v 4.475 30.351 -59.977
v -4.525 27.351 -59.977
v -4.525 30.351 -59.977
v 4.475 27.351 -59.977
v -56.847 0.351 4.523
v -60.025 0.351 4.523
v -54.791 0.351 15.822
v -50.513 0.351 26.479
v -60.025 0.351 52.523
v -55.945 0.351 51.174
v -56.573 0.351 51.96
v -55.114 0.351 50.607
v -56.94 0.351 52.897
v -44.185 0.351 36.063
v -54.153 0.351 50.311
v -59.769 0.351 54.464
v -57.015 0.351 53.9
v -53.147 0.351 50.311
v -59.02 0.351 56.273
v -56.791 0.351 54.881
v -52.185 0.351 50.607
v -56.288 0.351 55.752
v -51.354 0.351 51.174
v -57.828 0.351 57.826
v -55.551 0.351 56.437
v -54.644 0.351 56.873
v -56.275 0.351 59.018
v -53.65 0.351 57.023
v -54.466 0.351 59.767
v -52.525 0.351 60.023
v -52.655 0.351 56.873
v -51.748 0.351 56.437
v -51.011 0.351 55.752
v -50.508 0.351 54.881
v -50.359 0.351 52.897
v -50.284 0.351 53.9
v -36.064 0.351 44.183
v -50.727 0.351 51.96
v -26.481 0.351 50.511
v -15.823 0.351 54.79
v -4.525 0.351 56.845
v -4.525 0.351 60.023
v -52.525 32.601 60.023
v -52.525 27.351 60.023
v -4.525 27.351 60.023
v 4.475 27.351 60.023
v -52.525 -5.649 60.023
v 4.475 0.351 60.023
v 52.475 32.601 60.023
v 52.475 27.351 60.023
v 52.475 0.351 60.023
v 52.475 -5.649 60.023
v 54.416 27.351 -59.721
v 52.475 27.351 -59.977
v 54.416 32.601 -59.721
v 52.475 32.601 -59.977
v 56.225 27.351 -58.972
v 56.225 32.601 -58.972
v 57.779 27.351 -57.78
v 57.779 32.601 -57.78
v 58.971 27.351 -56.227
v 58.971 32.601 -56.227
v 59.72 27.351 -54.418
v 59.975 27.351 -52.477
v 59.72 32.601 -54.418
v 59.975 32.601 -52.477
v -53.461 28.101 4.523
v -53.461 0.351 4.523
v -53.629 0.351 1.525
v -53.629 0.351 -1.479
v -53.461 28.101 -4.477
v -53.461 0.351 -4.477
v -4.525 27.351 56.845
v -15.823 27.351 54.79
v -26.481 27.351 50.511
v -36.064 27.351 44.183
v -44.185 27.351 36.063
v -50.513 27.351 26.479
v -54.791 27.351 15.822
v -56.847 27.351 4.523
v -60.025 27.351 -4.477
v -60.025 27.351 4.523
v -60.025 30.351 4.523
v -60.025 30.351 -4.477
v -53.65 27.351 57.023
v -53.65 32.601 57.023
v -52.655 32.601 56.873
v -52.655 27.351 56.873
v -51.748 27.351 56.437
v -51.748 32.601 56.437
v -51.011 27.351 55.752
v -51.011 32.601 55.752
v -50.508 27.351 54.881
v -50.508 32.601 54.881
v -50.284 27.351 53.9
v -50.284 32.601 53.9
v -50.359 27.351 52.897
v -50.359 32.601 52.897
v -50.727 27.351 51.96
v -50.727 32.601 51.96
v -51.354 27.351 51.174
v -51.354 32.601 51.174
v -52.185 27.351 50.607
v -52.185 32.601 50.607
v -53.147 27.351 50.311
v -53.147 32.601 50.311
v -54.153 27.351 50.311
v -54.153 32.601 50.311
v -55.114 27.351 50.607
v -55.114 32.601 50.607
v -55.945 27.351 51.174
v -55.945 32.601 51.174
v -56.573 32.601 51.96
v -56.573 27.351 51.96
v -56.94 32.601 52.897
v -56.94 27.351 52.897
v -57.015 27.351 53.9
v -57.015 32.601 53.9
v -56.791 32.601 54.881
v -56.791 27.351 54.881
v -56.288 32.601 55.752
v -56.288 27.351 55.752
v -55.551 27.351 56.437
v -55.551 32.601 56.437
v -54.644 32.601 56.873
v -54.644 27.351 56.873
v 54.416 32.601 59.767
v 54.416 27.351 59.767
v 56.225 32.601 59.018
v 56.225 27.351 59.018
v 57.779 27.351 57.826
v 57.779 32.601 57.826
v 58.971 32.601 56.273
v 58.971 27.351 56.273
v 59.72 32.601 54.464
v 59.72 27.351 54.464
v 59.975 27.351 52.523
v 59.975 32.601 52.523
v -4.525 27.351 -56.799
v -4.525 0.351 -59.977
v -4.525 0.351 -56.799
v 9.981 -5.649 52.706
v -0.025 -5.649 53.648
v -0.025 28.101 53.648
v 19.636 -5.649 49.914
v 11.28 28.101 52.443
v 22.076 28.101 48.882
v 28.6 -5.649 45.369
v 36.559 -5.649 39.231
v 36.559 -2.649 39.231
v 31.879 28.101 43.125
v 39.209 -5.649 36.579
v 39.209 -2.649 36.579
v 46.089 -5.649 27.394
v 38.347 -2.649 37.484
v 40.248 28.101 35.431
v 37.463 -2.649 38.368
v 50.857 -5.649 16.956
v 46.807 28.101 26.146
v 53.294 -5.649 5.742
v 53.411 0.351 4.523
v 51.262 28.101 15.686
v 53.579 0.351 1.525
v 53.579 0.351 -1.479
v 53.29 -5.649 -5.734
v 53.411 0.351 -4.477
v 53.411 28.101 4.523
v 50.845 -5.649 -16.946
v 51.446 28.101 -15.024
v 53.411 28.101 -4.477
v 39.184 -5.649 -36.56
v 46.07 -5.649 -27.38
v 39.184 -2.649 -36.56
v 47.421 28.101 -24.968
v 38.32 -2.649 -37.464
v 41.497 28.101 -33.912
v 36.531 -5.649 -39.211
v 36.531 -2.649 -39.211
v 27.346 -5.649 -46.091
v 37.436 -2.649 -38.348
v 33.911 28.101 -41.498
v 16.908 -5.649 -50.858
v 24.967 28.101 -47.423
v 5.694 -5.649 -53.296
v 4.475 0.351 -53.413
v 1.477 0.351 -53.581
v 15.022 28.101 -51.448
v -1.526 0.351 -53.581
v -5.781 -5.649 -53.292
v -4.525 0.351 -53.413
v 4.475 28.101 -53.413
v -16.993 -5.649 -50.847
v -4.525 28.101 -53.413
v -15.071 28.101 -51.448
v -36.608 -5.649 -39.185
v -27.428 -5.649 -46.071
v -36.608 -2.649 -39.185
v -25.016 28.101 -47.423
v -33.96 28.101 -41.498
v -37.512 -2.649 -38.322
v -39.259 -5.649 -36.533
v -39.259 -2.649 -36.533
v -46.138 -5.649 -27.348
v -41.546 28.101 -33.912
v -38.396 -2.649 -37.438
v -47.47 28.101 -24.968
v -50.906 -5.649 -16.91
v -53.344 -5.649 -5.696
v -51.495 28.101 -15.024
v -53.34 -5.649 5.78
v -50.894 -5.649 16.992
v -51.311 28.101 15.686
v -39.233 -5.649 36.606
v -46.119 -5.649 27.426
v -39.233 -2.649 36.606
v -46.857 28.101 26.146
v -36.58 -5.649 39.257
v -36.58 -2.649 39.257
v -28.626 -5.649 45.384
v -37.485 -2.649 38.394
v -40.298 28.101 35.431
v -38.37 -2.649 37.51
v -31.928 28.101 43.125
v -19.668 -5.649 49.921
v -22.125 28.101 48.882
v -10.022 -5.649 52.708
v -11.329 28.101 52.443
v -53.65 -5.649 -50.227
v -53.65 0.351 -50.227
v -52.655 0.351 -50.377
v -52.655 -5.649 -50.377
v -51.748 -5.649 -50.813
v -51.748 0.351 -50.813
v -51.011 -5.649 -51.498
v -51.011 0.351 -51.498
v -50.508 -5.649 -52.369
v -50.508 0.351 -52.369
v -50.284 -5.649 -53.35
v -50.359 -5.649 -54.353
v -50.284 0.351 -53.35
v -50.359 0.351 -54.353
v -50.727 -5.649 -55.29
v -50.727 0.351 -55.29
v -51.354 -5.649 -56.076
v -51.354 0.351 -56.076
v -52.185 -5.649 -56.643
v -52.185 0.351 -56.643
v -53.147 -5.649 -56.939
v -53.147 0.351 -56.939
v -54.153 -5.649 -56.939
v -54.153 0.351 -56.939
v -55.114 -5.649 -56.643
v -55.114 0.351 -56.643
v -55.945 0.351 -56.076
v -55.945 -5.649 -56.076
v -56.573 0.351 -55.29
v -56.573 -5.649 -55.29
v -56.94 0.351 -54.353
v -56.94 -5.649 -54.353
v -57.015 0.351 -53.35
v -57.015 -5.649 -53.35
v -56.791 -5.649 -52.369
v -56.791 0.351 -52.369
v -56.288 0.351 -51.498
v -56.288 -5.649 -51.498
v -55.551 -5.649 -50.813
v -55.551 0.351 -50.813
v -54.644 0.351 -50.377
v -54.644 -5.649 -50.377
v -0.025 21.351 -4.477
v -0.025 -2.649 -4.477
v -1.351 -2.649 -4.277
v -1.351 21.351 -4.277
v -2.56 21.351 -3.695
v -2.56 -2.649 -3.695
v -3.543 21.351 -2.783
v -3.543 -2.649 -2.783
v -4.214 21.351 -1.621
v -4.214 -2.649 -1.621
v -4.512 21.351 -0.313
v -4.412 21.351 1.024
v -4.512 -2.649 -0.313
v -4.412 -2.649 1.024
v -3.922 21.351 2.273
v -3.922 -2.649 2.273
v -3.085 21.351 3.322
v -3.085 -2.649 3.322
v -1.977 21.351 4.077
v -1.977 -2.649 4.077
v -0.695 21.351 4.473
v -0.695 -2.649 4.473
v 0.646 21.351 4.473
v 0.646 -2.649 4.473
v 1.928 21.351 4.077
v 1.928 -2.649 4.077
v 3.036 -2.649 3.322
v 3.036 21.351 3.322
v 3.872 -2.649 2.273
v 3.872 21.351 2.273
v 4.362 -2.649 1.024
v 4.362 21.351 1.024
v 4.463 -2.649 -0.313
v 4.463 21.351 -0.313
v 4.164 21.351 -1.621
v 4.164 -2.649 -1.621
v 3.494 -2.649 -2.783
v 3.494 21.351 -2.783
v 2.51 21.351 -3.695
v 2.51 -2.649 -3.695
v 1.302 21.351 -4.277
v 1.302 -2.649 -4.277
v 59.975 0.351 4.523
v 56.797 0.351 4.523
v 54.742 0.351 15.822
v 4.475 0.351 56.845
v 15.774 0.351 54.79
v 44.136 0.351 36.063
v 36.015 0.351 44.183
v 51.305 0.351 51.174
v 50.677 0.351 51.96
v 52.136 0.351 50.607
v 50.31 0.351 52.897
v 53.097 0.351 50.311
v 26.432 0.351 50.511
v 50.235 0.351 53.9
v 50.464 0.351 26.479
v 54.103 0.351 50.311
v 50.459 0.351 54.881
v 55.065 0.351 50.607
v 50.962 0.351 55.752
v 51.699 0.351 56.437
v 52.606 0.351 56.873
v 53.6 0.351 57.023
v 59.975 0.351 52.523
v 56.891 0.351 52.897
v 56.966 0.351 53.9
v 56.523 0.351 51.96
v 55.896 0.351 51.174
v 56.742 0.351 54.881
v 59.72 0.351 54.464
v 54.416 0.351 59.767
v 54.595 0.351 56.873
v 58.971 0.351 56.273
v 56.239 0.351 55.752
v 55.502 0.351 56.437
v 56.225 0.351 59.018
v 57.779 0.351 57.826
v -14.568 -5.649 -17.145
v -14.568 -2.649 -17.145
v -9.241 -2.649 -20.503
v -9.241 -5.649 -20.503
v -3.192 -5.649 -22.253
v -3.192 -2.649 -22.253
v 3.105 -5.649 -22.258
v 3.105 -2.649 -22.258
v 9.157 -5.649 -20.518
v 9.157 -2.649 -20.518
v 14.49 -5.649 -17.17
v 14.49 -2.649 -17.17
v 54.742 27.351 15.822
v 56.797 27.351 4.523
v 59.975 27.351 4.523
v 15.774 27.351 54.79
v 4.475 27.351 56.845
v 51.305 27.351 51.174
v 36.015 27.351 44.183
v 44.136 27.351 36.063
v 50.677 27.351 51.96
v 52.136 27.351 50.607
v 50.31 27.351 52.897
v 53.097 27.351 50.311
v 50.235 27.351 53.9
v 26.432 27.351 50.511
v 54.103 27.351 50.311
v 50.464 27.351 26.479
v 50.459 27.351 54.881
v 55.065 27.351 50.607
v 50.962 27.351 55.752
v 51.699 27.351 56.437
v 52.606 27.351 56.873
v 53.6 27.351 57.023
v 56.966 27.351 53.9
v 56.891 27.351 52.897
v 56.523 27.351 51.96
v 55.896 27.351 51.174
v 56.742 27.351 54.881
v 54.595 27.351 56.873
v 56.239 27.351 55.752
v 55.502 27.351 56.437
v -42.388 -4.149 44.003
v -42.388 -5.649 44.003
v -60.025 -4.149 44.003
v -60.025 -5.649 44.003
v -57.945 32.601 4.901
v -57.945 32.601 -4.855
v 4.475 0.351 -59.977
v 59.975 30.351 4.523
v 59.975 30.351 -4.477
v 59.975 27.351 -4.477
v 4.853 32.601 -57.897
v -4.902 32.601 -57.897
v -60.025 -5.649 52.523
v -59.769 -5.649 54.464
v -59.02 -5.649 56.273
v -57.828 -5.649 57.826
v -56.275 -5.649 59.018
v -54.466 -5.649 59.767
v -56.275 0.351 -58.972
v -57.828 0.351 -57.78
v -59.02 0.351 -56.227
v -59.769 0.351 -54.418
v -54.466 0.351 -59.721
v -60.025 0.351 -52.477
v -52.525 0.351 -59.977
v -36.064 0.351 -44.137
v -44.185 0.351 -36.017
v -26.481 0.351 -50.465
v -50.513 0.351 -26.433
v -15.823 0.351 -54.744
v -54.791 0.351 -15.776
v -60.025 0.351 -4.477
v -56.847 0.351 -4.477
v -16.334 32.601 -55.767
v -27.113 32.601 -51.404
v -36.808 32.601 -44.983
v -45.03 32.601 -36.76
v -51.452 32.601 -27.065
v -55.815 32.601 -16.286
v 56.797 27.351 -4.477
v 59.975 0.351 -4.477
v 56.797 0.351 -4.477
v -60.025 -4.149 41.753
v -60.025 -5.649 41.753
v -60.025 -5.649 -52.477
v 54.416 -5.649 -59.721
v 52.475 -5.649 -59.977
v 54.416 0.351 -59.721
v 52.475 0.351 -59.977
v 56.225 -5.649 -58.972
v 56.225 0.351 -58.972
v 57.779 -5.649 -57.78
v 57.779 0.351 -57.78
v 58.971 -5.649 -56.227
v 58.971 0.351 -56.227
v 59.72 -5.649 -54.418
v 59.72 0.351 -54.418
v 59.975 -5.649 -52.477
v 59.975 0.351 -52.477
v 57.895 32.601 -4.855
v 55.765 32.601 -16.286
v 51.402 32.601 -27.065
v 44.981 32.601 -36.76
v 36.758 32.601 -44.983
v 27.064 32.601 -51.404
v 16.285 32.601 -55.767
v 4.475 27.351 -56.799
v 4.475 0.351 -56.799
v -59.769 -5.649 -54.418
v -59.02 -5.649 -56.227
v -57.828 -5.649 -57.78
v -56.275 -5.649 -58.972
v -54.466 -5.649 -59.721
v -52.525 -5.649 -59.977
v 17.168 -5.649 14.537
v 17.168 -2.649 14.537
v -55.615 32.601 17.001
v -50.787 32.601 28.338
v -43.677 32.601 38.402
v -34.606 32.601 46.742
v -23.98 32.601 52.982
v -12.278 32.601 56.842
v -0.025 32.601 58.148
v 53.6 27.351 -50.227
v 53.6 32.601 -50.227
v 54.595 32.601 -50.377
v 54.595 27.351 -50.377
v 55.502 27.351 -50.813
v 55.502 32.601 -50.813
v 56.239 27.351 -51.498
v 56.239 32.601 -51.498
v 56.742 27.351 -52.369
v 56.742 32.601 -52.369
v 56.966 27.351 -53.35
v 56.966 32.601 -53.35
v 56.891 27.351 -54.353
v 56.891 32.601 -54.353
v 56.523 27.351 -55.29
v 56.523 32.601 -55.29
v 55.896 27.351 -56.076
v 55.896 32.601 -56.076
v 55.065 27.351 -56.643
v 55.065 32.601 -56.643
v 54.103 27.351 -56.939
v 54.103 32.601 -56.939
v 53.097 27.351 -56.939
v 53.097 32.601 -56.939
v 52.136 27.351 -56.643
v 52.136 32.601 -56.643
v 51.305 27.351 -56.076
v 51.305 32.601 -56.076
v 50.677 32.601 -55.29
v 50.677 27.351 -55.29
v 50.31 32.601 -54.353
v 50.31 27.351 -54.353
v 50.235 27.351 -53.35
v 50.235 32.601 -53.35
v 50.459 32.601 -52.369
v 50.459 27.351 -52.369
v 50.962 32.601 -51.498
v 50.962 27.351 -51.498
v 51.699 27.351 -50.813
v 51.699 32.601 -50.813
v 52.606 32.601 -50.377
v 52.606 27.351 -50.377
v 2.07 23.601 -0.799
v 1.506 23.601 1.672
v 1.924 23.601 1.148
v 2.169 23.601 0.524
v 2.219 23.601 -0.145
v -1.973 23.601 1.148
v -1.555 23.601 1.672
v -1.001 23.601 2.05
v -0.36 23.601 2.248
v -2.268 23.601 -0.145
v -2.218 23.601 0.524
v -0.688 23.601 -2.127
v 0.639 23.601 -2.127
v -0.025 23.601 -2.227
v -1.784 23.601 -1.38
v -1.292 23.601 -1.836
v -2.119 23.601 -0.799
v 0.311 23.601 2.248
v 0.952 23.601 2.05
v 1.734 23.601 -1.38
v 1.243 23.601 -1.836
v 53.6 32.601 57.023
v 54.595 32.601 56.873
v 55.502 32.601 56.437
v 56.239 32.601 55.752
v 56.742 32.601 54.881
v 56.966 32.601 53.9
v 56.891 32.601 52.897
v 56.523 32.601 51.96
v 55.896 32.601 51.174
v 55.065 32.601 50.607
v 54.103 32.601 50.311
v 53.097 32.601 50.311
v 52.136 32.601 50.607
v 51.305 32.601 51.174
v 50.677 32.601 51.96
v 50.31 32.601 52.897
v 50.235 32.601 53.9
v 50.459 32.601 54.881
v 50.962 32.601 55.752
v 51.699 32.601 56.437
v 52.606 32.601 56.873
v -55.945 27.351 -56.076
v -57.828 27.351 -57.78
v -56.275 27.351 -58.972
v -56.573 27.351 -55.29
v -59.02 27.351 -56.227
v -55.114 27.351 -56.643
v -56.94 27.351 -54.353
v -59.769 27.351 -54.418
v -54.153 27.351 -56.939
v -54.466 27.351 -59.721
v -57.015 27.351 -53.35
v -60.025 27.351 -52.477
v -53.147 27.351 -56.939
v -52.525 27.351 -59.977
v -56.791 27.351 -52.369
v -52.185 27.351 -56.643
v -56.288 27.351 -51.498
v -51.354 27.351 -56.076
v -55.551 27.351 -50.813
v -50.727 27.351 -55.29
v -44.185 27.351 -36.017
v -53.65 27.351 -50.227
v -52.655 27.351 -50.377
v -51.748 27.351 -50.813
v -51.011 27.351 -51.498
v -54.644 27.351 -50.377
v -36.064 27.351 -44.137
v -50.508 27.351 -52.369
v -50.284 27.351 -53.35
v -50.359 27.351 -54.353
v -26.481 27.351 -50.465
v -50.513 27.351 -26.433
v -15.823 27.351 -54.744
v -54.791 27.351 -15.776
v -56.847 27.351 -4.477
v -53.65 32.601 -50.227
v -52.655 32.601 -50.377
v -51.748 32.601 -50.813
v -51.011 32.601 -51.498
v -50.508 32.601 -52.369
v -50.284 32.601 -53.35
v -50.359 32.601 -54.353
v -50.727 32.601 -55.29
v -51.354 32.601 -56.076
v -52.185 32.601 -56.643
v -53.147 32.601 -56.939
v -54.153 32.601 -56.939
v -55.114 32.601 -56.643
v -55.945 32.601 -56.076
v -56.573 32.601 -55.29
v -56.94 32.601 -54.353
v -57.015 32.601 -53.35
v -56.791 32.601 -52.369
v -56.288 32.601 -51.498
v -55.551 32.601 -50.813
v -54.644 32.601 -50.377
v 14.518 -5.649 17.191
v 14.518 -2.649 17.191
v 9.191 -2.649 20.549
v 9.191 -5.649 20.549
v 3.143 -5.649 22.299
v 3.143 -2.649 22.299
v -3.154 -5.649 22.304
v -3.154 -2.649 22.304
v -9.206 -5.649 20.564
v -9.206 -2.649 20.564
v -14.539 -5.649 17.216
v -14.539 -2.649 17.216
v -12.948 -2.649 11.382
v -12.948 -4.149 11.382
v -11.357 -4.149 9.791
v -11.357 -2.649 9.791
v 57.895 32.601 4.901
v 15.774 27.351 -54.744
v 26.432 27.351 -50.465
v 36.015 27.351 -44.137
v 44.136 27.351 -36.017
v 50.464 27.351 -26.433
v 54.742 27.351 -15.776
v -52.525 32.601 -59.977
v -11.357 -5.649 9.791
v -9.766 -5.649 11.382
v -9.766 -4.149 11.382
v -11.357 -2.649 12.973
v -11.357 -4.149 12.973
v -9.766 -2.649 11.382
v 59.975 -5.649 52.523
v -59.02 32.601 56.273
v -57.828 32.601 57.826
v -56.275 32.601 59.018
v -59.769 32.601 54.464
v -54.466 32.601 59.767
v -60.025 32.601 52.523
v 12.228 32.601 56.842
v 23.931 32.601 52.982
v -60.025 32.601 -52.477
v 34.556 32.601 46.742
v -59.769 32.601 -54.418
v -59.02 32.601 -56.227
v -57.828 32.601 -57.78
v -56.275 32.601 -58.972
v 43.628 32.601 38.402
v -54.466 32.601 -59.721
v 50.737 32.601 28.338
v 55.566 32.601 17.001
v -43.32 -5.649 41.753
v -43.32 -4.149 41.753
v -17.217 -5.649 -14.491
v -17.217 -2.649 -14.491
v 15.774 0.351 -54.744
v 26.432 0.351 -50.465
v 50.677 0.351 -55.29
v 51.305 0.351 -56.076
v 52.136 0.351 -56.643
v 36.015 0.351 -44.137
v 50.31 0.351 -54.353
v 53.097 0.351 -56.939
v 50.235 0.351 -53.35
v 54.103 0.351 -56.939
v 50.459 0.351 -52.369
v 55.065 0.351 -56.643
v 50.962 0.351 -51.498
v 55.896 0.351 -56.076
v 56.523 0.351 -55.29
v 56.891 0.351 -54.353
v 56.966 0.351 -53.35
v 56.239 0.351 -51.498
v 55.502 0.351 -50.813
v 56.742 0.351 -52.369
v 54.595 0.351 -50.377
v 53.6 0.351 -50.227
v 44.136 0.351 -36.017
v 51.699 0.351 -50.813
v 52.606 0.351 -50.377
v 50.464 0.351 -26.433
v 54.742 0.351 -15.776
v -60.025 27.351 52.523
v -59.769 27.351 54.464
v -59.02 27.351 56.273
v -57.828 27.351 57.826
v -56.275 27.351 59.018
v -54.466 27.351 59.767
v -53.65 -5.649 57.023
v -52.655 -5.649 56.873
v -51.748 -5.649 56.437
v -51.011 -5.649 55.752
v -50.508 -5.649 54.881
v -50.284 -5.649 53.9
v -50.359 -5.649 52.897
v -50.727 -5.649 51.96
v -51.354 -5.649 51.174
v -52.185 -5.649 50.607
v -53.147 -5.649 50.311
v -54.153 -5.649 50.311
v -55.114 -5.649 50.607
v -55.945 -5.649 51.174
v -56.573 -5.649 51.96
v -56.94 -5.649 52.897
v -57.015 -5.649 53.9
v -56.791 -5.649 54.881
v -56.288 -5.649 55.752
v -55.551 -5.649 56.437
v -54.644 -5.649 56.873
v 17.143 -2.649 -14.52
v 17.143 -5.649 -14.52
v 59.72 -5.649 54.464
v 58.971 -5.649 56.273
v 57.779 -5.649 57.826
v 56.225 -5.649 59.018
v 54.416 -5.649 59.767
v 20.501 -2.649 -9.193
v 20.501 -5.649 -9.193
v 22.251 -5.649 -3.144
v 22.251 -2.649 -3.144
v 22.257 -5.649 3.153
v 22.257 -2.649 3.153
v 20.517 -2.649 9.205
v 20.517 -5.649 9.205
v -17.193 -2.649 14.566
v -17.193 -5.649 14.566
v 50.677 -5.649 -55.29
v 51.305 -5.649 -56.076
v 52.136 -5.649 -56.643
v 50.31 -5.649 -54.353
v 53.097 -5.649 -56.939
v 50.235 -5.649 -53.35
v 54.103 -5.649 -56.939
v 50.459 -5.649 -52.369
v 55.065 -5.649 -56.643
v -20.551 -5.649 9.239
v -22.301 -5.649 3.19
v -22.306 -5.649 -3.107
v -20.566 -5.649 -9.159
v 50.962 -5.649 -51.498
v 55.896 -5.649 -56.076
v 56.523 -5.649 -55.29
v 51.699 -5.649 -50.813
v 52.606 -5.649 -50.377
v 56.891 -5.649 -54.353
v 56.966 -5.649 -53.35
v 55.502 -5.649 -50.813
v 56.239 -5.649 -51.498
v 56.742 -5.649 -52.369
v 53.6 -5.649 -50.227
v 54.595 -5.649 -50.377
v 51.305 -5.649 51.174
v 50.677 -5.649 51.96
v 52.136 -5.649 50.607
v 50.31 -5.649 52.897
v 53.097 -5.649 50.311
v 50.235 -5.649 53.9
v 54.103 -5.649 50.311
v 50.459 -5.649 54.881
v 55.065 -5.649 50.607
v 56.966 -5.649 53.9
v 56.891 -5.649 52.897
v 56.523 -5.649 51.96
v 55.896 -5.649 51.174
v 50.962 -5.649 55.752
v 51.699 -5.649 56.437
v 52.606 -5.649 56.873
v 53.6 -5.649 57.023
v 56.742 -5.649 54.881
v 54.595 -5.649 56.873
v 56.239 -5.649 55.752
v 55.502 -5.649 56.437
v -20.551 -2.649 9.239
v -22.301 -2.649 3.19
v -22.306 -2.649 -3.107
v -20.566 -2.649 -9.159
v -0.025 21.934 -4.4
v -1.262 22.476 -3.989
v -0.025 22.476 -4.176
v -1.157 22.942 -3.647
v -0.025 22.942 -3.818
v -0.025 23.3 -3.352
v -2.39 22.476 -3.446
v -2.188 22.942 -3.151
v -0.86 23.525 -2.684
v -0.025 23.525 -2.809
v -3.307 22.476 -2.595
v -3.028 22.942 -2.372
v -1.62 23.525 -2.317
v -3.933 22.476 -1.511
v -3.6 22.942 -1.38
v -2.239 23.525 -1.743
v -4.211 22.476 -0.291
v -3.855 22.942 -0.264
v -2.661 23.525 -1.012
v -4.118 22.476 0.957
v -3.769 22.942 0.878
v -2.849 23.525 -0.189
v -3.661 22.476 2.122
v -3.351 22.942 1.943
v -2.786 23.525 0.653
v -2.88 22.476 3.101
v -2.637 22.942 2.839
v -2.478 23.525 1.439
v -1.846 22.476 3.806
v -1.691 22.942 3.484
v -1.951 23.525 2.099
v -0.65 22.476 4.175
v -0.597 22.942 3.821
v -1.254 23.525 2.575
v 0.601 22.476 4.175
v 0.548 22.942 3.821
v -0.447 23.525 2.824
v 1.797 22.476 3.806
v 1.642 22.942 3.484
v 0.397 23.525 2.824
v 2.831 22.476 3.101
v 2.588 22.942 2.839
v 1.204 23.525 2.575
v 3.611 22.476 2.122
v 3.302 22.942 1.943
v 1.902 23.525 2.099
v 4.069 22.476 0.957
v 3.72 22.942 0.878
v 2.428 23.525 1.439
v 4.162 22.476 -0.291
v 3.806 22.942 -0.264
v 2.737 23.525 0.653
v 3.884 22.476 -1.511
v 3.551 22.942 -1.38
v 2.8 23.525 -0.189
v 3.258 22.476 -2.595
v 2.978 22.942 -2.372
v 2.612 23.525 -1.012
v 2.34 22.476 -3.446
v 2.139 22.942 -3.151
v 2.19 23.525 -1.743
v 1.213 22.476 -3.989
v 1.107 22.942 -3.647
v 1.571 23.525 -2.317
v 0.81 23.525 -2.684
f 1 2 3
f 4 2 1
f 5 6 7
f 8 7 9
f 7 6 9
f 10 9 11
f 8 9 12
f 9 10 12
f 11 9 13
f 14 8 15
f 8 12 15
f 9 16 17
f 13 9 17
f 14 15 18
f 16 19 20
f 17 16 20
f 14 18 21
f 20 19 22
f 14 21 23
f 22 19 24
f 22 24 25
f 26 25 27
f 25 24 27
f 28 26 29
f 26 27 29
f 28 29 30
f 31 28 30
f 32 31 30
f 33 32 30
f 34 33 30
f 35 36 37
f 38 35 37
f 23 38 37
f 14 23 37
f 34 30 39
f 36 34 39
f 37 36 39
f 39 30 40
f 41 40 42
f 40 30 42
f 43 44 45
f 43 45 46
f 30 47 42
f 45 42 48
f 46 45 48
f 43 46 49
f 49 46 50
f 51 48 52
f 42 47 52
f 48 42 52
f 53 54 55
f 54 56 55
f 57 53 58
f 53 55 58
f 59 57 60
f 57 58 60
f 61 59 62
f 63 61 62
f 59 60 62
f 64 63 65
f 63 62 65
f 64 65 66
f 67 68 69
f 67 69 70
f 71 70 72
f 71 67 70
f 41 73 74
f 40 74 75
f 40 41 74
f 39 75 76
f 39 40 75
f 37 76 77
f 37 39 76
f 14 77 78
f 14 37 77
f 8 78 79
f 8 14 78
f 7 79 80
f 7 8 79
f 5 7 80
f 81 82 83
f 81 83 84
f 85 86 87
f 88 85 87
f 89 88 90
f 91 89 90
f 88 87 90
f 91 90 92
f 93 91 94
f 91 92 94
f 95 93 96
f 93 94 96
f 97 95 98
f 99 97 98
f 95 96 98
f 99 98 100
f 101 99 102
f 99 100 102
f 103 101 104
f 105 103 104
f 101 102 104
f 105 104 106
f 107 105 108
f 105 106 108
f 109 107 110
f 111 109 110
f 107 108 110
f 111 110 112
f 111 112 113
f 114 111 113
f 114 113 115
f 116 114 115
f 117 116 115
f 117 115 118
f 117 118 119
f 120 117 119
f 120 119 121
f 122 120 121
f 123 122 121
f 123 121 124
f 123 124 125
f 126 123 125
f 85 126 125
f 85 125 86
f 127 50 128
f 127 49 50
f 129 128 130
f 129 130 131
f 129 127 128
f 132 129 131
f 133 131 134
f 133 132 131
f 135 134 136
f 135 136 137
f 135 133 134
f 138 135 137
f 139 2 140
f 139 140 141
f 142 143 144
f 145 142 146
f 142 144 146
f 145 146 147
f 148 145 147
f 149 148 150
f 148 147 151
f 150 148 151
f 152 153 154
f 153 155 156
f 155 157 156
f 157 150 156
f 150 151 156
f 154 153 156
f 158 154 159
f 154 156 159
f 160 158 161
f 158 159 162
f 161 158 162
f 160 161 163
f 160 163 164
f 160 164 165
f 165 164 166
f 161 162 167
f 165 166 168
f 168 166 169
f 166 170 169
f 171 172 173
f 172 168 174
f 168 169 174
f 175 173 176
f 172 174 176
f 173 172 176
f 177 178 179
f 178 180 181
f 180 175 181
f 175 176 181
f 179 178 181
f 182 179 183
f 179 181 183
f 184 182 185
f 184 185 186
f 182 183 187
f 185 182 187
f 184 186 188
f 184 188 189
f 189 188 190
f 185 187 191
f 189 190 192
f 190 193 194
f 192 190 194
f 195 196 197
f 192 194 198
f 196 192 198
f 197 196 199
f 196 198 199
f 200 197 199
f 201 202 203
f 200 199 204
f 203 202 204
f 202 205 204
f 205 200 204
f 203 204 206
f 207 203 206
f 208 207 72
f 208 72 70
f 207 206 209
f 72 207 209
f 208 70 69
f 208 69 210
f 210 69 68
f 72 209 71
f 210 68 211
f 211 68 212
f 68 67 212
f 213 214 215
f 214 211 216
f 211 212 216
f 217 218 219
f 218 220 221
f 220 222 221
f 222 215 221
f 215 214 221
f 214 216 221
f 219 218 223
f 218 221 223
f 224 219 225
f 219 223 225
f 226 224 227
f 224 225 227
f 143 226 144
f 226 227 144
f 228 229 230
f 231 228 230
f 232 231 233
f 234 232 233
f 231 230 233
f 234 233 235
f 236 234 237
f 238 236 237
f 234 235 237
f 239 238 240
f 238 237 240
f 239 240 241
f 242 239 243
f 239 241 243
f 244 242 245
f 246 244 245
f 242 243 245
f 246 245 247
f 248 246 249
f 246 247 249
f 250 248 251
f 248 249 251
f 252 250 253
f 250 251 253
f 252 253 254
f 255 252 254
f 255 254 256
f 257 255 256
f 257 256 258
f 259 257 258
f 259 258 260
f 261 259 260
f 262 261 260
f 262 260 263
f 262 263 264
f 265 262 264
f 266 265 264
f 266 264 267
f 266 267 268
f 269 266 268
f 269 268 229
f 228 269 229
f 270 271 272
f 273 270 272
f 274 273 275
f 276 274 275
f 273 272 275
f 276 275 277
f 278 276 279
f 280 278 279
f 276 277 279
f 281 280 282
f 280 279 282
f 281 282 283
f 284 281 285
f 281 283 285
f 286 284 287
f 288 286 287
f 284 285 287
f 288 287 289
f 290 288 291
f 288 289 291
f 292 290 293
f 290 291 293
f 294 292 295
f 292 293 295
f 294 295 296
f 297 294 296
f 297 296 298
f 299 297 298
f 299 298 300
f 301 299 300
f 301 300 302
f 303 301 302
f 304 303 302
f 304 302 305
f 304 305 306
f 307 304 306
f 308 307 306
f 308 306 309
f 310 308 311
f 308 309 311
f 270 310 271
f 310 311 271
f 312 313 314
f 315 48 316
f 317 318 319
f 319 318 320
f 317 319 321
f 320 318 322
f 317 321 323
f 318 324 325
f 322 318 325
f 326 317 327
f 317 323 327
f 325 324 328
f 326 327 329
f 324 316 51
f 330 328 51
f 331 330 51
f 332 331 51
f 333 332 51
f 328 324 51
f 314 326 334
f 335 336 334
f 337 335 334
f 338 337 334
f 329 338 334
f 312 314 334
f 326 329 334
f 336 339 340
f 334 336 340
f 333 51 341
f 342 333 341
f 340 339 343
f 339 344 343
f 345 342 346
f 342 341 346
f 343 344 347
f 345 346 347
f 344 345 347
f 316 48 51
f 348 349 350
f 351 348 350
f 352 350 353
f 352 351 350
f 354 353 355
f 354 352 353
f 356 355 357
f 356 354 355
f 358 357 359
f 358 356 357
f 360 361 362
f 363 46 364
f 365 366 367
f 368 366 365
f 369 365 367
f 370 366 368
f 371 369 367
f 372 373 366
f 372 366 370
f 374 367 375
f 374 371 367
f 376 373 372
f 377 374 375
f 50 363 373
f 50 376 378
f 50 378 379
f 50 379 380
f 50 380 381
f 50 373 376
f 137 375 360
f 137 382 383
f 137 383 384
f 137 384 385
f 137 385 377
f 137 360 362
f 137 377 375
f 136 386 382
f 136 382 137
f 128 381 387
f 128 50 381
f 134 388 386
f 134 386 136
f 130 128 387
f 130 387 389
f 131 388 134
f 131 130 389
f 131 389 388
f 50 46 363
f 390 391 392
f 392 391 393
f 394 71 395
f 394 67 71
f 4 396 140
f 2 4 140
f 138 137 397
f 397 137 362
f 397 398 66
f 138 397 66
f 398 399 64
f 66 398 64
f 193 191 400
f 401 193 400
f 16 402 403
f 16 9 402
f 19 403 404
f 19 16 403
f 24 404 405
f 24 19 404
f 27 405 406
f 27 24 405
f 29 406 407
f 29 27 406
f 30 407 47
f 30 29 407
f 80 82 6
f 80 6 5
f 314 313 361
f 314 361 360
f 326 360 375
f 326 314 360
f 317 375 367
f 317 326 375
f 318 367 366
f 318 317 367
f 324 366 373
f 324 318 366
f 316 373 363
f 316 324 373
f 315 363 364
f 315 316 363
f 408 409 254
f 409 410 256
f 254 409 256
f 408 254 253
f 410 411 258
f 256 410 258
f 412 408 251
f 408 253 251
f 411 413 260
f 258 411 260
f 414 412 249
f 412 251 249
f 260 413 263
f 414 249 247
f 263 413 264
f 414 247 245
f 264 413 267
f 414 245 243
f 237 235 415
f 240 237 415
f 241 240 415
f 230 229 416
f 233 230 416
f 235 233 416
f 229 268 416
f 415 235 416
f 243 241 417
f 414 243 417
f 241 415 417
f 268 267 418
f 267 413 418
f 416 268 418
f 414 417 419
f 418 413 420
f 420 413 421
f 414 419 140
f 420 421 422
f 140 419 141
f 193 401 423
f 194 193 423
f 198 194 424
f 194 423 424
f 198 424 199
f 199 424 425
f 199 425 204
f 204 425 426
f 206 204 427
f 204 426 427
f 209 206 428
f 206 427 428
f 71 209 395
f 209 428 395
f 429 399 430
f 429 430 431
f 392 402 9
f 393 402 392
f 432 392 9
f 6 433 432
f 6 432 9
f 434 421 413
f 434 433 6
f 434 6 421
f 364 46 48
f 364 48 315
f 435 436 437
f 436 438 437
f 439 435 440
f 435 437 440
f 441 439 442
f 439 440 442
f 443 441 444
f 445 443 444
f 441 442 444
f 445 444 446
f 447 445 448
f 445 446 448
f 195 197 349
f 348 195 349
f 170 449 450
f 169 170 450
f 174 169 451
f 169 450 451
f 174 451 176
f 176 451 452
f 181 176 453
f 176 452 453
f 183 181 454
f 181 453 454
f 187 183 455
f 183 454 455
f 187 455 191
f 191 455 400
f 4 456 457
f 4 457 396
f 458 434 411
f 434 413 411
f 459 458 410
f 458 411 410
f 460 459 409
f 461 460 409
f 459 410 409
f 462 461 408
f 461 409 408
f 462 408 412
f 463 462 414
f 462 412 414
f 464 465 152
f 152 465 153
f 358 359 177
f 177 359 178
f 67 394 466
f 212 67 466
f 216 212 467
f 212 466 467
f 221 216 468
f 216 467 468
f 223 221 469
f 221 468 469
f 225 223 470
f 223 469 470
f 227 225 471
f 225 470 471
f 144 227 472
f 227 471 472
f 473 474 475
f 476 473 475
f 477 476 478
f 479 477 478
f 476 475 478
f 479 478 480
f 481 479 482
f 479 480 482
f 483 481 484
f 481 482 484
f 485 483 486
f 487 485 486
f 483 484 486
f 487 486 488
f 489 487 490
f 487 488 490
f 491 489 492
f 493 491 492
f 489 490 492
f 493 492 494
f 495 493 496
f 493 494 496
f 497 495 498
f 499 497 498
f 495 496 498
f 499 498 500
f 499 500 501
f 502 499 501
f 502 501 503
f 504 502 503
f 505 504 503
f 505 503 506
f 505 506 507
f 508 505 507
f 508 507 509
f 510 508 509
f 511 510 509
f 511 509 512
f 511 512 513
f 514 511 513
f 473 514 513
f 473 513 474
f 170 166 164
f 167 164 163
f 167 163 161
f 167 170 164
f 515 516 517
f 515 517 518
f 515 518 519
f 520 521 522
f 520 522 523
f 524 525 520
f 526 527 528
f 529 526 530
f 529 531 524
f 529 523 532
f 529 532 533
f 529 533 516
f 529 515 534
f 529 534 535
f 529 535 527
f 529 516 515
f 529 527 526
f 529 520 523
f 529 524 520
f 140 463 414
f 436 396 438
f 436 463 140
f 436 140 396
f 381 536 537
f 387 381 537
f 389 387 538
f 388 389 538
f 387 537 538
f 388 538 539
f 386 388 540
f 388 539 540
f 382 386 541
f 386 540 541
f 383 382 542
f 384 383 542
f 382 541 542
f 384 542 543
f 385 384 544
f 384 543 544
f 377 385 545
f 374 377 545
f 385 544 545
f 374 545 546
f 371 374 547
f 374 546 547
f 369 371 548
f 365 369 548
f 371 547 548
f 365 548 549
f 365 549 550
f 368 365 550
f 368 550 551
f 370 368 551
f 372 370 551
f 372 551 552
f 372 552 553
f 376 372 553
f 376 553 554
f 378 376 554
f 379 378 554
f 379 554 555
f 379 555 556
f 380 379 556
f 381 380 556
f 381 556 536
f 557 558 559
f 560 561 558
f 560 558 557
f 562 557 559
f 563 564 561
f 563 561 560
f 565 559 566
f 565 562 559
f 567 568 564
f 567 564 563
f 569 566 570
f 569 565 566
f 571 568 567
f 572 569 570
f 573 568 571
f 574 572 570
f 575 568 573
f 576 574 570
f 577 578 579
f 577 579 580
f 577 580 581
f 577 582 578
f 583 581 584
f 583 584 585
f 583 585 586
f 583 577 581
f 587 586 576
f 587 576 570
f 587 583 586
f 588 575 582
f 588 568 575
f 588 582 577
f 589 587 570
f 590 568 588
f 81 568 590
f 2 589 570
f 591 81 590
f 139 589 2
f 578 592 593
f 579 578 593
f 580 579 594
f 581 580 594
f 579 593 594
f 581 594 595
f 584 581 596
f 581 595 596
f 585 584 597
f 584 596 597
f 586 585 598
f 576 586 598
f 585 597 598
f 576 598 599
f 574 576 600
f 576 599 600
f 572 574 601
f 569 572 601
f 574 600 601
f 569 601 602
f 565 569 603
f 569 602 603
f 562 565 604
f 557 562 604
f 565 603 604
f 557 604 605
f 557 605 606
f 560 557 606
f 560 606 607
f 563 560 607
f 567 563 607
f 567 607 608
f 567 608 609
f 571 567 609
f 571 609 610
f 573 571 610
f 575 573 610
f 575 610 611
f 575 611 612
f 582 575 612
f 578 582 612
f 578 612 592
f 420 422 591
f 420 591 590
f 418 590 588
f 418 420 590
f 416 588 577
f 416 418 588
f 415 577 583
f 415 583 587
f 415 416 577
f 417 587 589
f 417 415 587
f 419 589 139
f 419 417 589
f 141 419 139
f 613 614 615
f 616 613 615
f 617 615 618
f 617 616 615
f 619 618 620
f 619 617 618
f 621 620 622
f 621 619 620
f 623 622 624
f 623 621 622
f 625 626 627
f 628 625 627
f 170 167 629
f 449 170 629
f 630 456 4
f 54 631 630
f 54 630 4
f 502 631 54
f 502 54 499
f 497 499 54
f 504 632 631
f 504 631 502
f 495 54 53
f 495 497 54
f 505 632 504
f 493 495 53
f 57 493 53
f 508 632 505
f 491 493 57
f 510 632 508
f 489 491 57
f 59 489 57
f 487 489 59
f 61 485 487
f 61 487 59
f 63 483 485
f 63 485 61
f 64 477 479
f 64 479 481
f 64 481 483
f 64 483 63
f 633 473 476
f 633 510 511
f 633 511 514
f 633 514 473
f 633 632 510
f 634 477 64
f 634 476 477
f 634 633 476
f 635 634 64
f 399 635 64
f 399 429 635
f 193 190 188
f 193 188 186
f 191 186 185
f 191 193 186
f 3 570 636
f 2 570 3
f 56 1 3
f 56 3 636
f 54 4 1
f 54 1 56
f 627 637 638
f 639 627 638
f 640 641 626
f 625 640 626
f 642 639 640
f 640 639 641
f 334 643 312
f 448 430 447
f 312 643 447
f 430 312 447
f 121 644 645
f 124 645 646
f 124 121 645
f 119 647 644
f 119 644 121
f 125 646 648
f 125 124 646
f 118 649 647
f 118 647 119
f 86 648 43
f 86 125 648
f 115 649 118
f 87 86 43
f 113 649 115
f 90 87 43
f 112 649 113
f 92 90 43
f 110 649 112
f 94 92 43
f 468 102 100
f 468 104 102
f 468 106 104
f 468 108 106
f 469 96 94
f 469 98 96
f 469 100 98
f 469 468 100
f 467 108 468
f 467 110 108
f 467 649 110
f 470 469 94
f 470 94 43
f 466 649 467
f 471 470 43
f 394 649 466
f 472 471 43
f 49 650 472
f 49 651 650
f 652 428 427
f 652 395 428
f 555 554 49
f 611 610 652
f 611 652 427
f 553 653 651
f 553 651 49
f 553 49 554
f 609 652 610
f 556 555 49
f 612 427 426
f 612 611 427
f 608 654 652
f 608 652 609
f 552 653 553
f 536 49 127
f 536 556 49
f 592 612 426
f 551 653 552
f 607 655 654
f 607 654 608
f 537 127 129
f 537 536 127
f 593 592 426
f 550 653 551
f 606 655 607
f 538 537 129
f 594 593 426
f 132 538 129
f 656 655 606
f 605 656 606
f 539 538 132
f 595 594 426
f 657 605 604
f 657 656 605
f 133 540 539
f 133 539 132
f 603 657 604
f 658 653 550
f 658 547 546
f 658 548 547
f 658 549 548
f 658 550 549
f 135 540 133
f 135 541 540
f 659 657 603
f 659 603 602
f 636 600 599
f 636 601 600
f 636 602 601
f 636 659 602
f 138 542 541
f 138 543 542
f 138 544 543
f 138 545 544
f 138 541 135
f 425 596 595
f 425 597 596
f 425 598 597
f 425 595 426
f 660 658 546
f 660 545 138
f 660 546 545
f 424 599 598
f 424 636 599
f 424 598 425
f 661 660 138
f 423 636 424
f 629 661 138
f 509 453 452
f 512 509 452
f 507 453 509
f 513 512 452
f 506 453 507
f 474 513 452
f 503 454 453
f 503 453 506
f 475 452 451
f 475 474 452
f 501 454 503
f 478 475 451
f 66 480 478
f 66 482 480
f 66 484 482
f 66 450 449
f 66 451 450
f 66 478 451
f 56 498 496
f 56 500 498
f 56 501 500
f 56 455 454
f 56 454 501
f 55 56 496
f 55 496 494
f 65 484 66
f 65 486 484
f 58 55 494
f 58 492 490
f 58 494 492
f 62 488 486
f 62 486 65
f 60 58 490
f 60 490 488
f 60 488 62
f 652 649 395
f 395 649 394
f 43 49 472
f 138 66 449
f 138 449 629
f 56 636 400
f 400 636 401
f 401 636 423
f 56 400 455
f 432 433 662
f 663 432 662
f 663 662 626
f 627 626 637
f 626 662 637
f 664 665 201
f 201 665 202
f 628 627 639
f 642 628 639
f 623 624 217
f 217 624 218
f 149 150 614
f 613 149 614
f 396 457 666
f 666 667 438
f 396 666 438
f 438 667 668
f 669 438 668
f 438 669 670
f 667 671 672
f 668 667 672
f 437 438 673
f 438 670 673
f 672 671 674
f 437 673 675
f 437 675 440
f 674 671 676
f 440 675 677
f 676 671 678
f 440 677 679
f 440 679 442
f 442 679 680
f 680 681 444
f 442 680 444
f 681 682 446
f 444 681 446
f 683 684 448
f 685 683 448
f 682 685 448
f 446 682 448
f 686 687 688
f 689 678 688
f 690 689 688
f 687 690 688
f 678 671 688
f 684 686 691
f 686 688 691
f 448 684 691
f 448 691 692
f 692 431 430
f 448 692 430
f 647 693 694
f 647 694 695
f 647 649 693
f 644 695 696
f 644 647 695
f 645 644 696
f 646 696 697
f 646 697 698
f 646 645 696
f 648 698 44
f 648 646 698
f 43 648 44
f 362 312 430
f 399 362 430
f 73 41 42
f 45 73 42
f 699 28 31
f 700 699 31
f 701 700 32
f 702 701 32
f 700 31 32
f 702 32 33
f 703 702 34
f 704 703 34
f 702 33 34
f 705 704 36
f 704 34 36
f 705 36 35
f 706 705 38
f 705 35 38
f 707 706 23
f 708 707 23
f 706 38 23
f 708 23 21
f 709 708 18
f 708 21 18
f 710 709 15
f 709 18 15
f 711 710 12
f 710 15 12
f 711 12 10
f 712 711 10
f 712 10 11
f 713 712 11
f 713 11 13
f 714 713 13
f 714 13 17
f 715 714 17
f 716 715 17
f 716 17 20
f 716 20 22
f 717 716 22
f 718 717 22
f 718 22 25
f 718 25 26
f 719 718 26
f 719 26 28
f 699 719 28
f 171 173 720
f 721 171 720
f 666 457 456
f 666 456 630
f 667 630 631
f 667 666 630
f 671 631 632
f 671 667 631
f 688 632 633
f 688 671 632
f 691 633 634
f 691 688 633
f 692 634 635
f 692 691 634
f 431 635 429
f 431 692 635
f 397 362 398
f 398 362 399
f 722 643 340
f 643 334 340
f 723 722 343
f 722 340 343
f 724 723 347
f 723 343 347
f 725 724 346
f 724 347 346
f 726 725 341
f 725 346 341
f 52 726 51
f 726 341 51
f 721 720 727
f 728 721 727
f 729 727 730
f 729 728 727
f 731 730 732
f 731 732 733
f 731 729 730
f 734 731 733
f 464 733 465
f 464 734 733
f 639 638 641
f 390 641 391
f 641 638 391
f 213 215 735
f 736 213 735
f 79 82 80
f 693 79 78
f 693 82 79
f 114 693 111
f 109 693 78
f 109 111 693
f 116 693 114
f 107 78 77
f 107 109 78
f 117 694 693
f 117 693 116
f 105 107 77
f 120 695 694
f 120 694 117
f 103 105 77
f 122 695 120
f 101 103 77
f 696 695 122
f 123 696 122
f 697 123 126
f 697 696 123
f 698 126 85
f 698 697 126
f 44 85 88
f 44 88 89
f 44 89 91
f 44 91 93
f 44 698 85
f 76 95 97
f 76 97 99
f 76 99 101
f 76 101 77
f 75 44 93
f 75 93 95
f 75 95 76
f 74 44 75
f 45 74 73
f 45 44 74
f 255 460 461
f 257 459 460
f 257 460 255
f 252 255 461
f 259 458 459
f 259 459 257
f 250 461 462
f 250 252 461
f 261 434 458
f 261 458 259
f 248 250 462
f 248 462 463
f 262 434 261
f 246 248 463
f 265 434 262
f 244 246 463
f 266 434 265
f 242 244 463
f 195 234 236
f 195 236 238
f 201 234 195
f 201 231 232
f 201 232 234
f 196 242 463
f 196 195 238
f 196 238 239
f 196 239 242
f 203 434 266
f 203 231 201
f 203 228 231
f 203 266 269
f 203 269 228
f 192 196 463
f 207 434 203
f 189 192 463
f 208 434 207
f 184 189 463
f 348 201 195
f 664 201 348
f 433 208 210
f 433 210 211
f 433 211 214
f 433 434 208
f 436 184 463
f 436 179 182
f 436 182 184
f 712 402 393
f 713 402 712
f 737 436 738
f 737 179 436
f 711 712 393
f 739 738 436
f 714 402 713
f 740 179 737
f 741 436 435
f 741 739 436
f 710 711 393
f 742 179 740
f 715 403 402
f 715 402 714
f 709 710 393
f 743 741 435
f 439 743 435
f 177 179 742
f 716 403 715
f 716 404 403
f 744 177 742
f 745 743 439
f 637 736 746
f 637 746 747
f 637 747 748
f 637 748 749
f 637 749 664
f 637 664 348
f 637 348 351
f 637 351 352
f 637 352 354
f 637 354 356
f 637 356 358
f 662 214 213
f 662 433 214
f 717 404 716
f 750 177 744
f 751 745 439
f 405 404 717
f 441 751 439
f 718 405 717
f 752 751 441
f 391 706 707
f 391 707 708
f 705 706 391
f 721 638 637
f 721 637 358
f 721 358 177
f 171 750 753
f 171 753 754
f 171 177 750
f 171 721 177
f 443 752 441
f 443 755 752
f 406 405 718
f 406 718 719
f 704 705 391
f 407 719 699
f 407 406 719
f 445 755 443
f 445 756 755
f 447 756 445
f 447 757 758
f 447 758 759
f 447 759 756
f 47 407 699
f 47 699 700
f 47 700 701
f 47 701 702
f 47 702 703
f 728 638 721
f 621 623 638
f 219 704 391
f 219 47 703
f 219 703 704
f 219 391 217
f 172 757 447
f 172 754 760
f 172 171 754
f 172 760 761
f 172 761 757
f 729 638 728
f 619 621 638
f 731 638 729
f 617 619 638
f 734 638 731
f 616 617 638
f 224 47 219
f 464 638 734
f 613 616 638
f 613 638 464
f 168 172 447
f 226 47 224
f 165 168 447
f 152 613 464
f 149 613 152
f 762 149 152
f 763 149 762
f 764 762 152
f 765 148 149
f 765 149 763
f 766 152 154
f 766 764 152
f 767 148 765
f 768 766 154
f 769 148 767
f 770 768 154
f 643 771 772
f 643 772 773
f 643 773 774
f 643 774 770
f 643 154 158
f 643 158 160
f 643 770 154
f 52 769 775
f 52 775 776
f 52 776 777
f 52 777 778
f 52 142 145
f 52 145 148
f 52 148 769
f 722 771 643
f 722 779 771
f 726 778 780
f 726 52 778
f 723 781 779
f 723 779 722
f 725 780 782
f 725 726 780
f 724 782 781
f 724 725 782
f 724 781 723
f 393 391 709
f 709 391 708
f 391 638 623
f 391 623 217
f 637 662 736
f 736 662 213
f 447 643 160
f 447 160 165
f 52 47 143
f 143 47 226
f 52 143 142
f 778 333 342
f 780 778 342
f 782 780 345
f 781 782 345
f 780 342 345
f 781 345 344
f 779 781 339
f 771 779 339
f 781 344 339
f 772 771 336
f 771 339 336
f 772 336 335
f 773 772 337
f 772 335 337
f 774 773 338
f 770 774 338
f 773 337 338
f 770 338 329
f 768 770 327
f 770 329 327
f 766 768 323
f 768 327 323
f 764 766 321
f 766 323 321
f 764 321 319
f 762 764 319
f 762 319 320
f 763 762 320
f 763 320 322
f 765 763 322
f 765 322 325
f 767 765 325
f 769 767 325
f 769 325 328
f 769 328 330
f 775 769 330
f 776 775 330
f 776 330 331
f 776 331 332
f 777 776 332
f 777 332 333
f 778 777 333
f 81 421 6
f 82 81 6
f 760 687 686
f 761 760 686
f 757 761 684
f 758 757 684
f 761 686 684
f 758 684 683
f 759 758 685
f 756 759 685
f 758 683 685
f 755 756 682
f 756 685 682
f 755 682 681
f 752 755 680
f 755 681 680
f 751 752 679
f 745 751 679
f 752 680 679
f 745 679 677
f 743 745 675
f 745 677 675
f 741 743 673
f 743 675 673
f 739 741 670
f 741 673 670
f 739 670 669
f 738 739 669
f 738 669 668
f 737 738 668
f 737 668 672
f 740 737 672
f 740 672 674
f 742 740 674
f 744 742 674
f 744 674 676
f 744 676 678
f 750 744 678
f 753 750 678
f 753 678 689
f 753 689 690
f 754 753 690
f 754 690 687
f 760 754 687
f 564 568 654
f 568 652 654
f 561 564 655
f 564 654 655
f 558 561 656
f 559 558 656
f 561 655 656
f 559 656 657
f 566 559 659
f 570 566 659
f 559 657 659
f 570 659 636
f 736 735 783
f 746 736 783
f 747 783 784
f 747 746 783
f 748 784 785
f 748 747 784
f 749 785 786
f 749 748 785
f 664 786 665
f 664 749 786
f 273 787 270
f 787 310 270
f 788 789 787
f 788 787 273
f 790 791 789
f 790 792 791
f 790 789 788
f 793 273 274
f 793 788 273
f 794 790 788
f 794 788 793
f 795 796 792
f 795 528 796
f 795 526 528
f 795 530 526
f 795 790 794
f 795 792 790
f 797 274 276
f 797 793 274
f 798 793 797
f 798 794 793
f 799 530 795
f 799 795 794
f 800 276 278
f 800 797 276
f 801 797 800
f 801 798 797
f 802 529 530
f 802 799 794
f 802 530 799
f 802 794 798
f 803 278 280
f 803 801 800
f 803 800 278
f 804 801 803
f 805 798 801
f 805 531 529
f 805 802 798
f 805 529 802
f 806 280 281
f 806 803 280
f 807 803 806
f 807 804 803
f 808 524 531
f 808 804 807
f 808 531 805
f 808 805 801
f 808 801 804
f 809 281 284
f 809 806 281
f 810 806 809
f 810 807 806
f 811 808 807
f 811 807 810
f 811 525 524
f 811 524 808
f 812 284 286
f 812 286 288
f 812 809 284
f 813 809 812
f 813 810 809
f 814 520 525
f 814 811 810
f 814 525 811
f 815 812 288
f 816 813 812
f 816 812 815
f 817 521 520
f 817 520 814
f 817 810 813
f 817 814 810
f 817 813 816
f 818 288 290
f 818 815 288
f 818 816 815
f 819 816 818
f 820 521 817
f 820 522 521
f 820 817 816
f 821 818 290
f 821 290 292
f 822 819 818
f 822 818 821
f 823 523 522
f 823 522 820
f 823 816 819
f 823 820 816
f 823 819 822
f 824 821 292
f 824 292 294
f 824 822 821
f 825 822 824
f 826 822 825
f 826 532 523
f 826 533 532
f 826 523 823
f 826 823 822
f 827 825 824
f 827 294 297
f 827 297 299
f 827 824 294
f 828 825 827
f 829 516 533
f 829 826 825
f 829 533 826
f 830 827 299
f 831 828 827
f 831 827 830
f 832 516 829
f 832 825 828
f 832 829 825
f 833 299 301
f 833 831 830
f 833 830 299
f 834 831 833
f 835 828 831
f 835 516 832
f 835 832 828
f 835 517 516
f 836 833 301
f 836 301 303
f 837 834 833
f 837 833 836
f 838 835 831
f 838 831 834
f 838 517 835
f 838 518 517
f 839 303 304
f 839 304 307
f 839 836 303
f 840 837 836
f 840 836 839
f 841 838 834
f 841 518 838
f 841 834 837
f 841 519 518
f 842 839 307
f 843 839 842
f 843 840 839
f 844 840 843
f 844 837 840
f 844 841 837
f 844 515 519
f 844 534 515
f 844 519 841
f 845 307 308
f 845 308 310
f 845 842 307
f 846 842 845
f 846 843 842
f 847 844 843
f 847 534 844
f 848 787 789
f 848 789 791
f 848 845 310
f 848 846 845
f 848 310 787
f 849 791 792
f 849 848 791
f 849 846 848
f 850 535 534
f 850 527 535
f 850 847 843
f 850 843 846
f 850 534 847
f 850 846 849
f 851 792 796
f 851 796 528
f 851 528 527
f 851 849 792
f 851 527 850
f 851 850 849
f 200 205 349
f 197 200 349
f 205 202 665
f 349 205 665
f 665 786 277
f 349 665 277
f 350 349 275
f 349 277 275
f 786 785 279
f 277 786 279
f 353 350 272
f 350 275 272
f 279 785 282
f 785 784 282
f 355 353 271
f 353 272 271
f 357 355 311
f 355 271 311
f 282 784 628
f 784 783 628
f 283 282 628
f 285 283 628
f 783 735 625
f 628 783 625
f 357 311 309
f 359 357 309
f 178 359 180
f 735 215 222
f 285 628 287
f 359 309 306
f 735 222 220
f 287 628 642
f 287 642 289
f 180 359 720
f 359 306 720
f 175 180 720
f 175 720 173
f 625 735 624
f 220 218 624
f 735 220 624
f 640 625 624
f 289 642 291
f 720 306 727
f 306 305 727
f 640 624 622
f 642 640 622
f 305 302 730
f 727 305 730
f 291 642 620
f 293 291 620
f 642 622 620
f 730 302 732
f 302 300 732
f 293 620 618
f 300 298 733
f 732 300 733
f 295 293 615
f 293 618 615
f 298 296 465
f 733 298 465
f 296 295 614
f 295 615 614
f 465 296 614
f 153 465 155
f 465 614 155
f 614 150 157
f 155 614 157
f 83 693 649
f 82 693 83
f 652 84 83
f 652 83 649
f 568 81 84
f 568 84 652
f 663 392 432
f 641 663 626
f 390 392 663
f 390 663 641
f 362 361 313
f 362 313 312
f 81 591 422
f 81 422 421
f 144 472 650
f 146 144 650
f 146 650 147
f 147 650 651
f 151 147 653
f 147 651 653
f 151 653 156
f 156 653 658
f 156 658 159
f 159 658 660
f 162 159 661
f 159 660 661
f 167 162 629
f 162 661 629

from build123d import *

# Parameters (mm, degrees)
SKETCH1_W            = 80
SKETCH1_H            = 80
BOSS_EXTRUDE1_DEPTH  = 25.5
SKETCH2_R            = 35.75
CUT_EXTRUDE2_DEPTH   = 28
BOSS_EXTRUDE2_START  = -2
BOSS_EXTRUDE2_DEPTH  = 2
CIRPATTERN2_COUNT    = 4
SKETCH5_R            = 15
BOSS_EXTRUDE3_DEPTH  = 2
SKETCH6_R            = 3
BOSS_EXTRUDE4_DEPTH  = 17.5
FILLET1_R            = 1.5
SKETCH7_R            = 70
SKETCH7_R_2          = 38
CUT_EXTRUDE4_DEPTH   = 18
FILLET2_R            = 5
BOSS_EXTRUDE5_START  = -20
BOSS_EXTRUDE5_DEPTH  = 20
CIRPATTERN3_COUNT    = 4
SKETCH9_R            = 2.25
CUT_EXTRUDE5_DEPTH   = 37
LPATTERN1_COUNT      = 2
LPATTERN1_PITCH      = 71.5
LPATTERN1_COUNT_DIR2 = 2
LPATTERN1_PITCH_DIR2 = 71.5
CHAMFER2_SIZE        = 3
CUT_EXTRUDE6_DEPTH   = 1
CUT_EXTRUDE7_DEPTH   = 7
SCALE1_SCALE         = 1.5


with BuildPart() as part:
    # Sketch1 → Boss-Extrude1 (new body)
    with BuildSketch(Plane(origin=(0, 0, 0), x_dir=(1, 0, 0), z_dir=(0, 1, 0))):
        Rectangle(SKETCH1_W, SKETCH1_H)
    extrude(amount=BOSS_EXTRUDE1_DEPTH)

    # Sketch2 → Cut-Extrude2 (cut)
    with BuildSketch(Plane(origin=(0, 25.5, 0), x_dir=(1, 0, 0), z_dir=(0, 1, 0))):
        with Locations(Location((0, 0, 0), (0, 0, 270))):
            Circle(SKETCH2_R)
    extrude(amount=-CUT_EXTRUDE2_DEPTH, mode=Mode.SUBTRACT)

    # Sketch4 → Boss-Extrude2 (add)
    with BuildSketch(Plane.XZ.offset(BOSS_EXTRUDE2_START)):
        with BuildLine():
            Line((-1.75, 0), (0, 1.785533906))
            Line((0, 1.785533906), (-24.370530875, 26.156064781))
            ThreePointArc((-24.370530875, 26.156064781), (-25.270176953, 25.287954776), (-26.138919431, 24.388919431))
            Line((-26.138919431, 24.388919431), (-1.75, 0))
        make_face()
    boss_extrude2 = extrude(amount=BOSS_EXTRUDE2_DEPTH)

    # CirPattern2: Boss-Extrude2 ×4 about axis
    cirpattern2_axis = Axis((0, 0, 0), (0, 1, 0))
    for i in range(1, CIRPATTERN2_COUNT):
        add(boss_extrude2.rotate(cirpattern2_axis, i * 360 / CIRPATTERN2_COUNT))

    # Sketch5 → Boss-Extrude3 (add)
    with BuildSketch(Plane.XZ):
        Circle(SKETCH5_R)
    extrude(amount=-BOSS_EXTRUDE3_DEPTH)

    # Sketch6 → Boss-Extrude4 (add)
    with BuildSketch(Plane(origin=(0, 2, 0), x_dir=(1, 0, 0), z_dir=(0, 1, 0))):
        with Locations(Location((0, 0, 0), (0, 0, 90))):
            Circle(SKETCH6_R)
    extrude(amount=BOSS_EXTRUDE4_DEPTH)

    # Fillet1
    fillet1_edges = [part.edges().sort_by_distance(p)[0] for p in [
        (0, 19.5, 3),
    ]]
    fillet(fillet1_edges, radius=FILLET1_R)

    # Sketch7 → Cut-Extrude4 (cut)
    with BuildSketch(Plane.XZ.offset(-4)):
        Circle(SKETCH7_R)
        with Locations(Location((0, 0, 0), (0, 0, 270))):
            Circle(SKETCH7_R_2, mode=Mode.SUBTRACT)
    extrude(amount=-CUT_EXTRUDE4_DEPTH, mode=Mode.SUBTRACT)

    # Fillet2
    fillet2_edges = [part.edges().sort_by_distance(p)[0] for p in [
        (-40, 2, -40),
        (40, 2, -40),
        (40, 2, 40),
        (-40, 2, 40),
        (-40, 23.75, -40),
        (40, 23.75, -40),
        (40, 23.75, 40),
        (-40, 23.75, 40),
    ]]
    fillet(fillet2_edges, radius=FILLET2_R)

    # Sketch8 → Boss-Extrude5 (add)
    with BuildSketch(Plane.XZ.offset(-4).offset(BOSS_EXTRUDE5_START)):
        with BuildLine():
            Line((-3, 40), (3, 40))
            Line((3, 40), (3, 35.623903492))
            ThreePointArc((3, 35.623903492), (0, 35.75), (-3, 35.623903492))
            Line((-3, 35.623903492), (-3, 40))
        make_face()
    boss_extrude5 = extrude(amount=BOSS_EXTRUDE5_DEPTH)

    # CirPattern3: Boss-Extrude5 ×4 about axis
    cirpattern3_axis = Axis((0, 0, 0), (0, 1, 0))
    for i in range(1, CIRPATTERN3_COUNT):
        add(boss_extrude5.rotate(cirpattern3_axis, i * 360 / CIRPATTERN3_COUNT))

    # Sketch9 → Cut-Extrude5 (cut)
    with BuildSketch(Plane(origin=(0, 25.5, 0), x_dir=(-1, 0, 0), z_dir=(0, 1, 0))):
        with Locations(Location((35.75, -35.75, 0), (0, 0, 90))):
            Circle(SKETCH9_R)
    cut_extrude5 = extrude(amount=-CUT_EXTRUDE5_DEPTH, mode=Mode.SUBTRACT)

    # LPattern1: Cut-Extrude5 2 × 2
    with Locations(*[(i * LPATTERN1_PITCH, 0, j * LPATTERN1_PITCH_DIR2) for i in range(LPATTERN1_COUNT) for j in range(LPATTERN1_COUNT_DIR2) if (i, j) != (0, 0)]):
        add(cut_extrude5, mode=Mode.SUBTRACT)

    # Chamfer2
    chamfer2_edges = [part.edges().sort_by_distance(p)[0] for p in [
        (0, 25.5, -35.75),
    ]]
    chamfer(chamfer2_edges, length=CHAMFER2_SIZE)

    # Sketch11 → Cut-Extrude6 (cut)
    with BuildSketch(Plane.XZ):
        Polygon((-28.863216429, 27.820323211), (-7.554875149, 6.51198193), (-6.494214977, 7.572642102), (-28.241896086, 29.320323211), (-40, 29.320323211), (-40, 27.820323211), align=None)
    extrude(amount=-CUT_EXTRUDE6_DEPTH, mode=Mode.SUBTRACT)

    # Sketch12 → Cut-Extrude7 (cut)
    with BuildSketch(Plane.XZ.offset(-1)):
        Polygon((-6.494214977, 7.572642102), (-7.554875149, 8.633302273), (-8.61553532, 7.572642102), (-7.554875149, 6.51198193), align=None)
    extrude(amount=-CUT_EXTRUDE7_DEPTH, mode=Mode.SUBTRACT)


with BuildPart() as part_1:
    # Scale1: scaled about (0.049360087, 11.297047604, -0.045989388)
    add(part.part.scale(SCALE1_SCALE).moved(Location((-0.024680043, -5.648523802, 0.022994694))))


solid = part_1.part
